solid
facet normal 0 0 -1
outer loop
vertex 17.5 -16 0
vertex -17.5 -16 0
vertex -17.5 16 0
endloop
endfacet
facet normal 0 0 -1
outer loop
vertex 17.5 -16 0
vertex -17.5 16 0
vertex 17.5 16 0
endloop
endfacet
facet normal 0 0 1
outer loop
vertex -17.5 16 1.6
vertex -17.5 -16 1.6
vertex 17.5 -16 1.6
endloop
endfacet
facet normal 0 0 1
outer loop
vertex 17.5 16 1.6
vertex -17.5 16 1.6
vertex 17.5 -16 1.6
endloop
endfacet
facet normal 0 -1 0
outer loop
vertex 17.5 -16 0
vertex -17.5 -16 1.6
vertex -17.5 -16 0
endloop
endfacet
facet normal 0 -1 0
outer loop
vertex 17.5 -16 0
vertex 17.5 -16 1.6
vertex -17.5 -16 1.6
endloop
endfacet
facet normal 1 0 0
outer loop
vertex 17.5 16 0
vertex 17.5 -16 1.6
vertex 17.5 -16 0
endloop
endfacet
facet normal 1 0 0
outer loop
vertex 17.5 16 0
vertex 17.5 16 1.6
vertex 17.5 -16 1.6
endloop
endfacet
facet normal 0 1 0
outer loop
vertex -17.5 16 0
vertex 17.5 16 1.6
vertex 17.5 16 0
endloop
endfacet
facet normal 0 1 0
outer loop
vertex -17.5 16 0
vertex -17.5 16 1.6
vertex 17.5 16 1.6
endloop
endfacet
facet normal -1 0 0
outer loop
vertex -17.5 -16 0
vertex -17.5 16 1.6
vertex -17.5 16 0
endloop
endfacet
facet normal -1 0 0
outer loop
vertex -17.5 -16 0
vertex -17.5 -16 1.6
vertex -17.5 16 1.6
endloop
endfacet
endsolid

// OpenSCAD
$fn = 64;

// Motor driver module PCB dimensions (mm)
length = 35.0;
width  = 32.0;
thickness = 1.6;

// Rounded corner radius (0 = sharp corners)
corner_radius = 0.0;

// 2D rounded rectangle helper (robust for r=0 and small sizes)
module rounded_rect_2d(l, w, r) {
    r2 = max(0, min(r, min(l, w)/2));
    if (r2 == 0) {
        square([l, w], center=true);
    } else {
        offset(r=r2)
            square([l - 2*r2, w - 2*r2], center=true);
    }
}

// PCB plate (single connected solid)
module pcb_plate() {
    color([0.0, 0.4, 0.2])
        linear_extrude(height=thickness, center=false, convexity=10)
            rounded_rect_2d(length, width, corner_radius);
}

// Place PCB so it spans z=[0..thickness] (avoids any center/preview edge cases)
translate([0, 0, 0])
    pcb_plate();
